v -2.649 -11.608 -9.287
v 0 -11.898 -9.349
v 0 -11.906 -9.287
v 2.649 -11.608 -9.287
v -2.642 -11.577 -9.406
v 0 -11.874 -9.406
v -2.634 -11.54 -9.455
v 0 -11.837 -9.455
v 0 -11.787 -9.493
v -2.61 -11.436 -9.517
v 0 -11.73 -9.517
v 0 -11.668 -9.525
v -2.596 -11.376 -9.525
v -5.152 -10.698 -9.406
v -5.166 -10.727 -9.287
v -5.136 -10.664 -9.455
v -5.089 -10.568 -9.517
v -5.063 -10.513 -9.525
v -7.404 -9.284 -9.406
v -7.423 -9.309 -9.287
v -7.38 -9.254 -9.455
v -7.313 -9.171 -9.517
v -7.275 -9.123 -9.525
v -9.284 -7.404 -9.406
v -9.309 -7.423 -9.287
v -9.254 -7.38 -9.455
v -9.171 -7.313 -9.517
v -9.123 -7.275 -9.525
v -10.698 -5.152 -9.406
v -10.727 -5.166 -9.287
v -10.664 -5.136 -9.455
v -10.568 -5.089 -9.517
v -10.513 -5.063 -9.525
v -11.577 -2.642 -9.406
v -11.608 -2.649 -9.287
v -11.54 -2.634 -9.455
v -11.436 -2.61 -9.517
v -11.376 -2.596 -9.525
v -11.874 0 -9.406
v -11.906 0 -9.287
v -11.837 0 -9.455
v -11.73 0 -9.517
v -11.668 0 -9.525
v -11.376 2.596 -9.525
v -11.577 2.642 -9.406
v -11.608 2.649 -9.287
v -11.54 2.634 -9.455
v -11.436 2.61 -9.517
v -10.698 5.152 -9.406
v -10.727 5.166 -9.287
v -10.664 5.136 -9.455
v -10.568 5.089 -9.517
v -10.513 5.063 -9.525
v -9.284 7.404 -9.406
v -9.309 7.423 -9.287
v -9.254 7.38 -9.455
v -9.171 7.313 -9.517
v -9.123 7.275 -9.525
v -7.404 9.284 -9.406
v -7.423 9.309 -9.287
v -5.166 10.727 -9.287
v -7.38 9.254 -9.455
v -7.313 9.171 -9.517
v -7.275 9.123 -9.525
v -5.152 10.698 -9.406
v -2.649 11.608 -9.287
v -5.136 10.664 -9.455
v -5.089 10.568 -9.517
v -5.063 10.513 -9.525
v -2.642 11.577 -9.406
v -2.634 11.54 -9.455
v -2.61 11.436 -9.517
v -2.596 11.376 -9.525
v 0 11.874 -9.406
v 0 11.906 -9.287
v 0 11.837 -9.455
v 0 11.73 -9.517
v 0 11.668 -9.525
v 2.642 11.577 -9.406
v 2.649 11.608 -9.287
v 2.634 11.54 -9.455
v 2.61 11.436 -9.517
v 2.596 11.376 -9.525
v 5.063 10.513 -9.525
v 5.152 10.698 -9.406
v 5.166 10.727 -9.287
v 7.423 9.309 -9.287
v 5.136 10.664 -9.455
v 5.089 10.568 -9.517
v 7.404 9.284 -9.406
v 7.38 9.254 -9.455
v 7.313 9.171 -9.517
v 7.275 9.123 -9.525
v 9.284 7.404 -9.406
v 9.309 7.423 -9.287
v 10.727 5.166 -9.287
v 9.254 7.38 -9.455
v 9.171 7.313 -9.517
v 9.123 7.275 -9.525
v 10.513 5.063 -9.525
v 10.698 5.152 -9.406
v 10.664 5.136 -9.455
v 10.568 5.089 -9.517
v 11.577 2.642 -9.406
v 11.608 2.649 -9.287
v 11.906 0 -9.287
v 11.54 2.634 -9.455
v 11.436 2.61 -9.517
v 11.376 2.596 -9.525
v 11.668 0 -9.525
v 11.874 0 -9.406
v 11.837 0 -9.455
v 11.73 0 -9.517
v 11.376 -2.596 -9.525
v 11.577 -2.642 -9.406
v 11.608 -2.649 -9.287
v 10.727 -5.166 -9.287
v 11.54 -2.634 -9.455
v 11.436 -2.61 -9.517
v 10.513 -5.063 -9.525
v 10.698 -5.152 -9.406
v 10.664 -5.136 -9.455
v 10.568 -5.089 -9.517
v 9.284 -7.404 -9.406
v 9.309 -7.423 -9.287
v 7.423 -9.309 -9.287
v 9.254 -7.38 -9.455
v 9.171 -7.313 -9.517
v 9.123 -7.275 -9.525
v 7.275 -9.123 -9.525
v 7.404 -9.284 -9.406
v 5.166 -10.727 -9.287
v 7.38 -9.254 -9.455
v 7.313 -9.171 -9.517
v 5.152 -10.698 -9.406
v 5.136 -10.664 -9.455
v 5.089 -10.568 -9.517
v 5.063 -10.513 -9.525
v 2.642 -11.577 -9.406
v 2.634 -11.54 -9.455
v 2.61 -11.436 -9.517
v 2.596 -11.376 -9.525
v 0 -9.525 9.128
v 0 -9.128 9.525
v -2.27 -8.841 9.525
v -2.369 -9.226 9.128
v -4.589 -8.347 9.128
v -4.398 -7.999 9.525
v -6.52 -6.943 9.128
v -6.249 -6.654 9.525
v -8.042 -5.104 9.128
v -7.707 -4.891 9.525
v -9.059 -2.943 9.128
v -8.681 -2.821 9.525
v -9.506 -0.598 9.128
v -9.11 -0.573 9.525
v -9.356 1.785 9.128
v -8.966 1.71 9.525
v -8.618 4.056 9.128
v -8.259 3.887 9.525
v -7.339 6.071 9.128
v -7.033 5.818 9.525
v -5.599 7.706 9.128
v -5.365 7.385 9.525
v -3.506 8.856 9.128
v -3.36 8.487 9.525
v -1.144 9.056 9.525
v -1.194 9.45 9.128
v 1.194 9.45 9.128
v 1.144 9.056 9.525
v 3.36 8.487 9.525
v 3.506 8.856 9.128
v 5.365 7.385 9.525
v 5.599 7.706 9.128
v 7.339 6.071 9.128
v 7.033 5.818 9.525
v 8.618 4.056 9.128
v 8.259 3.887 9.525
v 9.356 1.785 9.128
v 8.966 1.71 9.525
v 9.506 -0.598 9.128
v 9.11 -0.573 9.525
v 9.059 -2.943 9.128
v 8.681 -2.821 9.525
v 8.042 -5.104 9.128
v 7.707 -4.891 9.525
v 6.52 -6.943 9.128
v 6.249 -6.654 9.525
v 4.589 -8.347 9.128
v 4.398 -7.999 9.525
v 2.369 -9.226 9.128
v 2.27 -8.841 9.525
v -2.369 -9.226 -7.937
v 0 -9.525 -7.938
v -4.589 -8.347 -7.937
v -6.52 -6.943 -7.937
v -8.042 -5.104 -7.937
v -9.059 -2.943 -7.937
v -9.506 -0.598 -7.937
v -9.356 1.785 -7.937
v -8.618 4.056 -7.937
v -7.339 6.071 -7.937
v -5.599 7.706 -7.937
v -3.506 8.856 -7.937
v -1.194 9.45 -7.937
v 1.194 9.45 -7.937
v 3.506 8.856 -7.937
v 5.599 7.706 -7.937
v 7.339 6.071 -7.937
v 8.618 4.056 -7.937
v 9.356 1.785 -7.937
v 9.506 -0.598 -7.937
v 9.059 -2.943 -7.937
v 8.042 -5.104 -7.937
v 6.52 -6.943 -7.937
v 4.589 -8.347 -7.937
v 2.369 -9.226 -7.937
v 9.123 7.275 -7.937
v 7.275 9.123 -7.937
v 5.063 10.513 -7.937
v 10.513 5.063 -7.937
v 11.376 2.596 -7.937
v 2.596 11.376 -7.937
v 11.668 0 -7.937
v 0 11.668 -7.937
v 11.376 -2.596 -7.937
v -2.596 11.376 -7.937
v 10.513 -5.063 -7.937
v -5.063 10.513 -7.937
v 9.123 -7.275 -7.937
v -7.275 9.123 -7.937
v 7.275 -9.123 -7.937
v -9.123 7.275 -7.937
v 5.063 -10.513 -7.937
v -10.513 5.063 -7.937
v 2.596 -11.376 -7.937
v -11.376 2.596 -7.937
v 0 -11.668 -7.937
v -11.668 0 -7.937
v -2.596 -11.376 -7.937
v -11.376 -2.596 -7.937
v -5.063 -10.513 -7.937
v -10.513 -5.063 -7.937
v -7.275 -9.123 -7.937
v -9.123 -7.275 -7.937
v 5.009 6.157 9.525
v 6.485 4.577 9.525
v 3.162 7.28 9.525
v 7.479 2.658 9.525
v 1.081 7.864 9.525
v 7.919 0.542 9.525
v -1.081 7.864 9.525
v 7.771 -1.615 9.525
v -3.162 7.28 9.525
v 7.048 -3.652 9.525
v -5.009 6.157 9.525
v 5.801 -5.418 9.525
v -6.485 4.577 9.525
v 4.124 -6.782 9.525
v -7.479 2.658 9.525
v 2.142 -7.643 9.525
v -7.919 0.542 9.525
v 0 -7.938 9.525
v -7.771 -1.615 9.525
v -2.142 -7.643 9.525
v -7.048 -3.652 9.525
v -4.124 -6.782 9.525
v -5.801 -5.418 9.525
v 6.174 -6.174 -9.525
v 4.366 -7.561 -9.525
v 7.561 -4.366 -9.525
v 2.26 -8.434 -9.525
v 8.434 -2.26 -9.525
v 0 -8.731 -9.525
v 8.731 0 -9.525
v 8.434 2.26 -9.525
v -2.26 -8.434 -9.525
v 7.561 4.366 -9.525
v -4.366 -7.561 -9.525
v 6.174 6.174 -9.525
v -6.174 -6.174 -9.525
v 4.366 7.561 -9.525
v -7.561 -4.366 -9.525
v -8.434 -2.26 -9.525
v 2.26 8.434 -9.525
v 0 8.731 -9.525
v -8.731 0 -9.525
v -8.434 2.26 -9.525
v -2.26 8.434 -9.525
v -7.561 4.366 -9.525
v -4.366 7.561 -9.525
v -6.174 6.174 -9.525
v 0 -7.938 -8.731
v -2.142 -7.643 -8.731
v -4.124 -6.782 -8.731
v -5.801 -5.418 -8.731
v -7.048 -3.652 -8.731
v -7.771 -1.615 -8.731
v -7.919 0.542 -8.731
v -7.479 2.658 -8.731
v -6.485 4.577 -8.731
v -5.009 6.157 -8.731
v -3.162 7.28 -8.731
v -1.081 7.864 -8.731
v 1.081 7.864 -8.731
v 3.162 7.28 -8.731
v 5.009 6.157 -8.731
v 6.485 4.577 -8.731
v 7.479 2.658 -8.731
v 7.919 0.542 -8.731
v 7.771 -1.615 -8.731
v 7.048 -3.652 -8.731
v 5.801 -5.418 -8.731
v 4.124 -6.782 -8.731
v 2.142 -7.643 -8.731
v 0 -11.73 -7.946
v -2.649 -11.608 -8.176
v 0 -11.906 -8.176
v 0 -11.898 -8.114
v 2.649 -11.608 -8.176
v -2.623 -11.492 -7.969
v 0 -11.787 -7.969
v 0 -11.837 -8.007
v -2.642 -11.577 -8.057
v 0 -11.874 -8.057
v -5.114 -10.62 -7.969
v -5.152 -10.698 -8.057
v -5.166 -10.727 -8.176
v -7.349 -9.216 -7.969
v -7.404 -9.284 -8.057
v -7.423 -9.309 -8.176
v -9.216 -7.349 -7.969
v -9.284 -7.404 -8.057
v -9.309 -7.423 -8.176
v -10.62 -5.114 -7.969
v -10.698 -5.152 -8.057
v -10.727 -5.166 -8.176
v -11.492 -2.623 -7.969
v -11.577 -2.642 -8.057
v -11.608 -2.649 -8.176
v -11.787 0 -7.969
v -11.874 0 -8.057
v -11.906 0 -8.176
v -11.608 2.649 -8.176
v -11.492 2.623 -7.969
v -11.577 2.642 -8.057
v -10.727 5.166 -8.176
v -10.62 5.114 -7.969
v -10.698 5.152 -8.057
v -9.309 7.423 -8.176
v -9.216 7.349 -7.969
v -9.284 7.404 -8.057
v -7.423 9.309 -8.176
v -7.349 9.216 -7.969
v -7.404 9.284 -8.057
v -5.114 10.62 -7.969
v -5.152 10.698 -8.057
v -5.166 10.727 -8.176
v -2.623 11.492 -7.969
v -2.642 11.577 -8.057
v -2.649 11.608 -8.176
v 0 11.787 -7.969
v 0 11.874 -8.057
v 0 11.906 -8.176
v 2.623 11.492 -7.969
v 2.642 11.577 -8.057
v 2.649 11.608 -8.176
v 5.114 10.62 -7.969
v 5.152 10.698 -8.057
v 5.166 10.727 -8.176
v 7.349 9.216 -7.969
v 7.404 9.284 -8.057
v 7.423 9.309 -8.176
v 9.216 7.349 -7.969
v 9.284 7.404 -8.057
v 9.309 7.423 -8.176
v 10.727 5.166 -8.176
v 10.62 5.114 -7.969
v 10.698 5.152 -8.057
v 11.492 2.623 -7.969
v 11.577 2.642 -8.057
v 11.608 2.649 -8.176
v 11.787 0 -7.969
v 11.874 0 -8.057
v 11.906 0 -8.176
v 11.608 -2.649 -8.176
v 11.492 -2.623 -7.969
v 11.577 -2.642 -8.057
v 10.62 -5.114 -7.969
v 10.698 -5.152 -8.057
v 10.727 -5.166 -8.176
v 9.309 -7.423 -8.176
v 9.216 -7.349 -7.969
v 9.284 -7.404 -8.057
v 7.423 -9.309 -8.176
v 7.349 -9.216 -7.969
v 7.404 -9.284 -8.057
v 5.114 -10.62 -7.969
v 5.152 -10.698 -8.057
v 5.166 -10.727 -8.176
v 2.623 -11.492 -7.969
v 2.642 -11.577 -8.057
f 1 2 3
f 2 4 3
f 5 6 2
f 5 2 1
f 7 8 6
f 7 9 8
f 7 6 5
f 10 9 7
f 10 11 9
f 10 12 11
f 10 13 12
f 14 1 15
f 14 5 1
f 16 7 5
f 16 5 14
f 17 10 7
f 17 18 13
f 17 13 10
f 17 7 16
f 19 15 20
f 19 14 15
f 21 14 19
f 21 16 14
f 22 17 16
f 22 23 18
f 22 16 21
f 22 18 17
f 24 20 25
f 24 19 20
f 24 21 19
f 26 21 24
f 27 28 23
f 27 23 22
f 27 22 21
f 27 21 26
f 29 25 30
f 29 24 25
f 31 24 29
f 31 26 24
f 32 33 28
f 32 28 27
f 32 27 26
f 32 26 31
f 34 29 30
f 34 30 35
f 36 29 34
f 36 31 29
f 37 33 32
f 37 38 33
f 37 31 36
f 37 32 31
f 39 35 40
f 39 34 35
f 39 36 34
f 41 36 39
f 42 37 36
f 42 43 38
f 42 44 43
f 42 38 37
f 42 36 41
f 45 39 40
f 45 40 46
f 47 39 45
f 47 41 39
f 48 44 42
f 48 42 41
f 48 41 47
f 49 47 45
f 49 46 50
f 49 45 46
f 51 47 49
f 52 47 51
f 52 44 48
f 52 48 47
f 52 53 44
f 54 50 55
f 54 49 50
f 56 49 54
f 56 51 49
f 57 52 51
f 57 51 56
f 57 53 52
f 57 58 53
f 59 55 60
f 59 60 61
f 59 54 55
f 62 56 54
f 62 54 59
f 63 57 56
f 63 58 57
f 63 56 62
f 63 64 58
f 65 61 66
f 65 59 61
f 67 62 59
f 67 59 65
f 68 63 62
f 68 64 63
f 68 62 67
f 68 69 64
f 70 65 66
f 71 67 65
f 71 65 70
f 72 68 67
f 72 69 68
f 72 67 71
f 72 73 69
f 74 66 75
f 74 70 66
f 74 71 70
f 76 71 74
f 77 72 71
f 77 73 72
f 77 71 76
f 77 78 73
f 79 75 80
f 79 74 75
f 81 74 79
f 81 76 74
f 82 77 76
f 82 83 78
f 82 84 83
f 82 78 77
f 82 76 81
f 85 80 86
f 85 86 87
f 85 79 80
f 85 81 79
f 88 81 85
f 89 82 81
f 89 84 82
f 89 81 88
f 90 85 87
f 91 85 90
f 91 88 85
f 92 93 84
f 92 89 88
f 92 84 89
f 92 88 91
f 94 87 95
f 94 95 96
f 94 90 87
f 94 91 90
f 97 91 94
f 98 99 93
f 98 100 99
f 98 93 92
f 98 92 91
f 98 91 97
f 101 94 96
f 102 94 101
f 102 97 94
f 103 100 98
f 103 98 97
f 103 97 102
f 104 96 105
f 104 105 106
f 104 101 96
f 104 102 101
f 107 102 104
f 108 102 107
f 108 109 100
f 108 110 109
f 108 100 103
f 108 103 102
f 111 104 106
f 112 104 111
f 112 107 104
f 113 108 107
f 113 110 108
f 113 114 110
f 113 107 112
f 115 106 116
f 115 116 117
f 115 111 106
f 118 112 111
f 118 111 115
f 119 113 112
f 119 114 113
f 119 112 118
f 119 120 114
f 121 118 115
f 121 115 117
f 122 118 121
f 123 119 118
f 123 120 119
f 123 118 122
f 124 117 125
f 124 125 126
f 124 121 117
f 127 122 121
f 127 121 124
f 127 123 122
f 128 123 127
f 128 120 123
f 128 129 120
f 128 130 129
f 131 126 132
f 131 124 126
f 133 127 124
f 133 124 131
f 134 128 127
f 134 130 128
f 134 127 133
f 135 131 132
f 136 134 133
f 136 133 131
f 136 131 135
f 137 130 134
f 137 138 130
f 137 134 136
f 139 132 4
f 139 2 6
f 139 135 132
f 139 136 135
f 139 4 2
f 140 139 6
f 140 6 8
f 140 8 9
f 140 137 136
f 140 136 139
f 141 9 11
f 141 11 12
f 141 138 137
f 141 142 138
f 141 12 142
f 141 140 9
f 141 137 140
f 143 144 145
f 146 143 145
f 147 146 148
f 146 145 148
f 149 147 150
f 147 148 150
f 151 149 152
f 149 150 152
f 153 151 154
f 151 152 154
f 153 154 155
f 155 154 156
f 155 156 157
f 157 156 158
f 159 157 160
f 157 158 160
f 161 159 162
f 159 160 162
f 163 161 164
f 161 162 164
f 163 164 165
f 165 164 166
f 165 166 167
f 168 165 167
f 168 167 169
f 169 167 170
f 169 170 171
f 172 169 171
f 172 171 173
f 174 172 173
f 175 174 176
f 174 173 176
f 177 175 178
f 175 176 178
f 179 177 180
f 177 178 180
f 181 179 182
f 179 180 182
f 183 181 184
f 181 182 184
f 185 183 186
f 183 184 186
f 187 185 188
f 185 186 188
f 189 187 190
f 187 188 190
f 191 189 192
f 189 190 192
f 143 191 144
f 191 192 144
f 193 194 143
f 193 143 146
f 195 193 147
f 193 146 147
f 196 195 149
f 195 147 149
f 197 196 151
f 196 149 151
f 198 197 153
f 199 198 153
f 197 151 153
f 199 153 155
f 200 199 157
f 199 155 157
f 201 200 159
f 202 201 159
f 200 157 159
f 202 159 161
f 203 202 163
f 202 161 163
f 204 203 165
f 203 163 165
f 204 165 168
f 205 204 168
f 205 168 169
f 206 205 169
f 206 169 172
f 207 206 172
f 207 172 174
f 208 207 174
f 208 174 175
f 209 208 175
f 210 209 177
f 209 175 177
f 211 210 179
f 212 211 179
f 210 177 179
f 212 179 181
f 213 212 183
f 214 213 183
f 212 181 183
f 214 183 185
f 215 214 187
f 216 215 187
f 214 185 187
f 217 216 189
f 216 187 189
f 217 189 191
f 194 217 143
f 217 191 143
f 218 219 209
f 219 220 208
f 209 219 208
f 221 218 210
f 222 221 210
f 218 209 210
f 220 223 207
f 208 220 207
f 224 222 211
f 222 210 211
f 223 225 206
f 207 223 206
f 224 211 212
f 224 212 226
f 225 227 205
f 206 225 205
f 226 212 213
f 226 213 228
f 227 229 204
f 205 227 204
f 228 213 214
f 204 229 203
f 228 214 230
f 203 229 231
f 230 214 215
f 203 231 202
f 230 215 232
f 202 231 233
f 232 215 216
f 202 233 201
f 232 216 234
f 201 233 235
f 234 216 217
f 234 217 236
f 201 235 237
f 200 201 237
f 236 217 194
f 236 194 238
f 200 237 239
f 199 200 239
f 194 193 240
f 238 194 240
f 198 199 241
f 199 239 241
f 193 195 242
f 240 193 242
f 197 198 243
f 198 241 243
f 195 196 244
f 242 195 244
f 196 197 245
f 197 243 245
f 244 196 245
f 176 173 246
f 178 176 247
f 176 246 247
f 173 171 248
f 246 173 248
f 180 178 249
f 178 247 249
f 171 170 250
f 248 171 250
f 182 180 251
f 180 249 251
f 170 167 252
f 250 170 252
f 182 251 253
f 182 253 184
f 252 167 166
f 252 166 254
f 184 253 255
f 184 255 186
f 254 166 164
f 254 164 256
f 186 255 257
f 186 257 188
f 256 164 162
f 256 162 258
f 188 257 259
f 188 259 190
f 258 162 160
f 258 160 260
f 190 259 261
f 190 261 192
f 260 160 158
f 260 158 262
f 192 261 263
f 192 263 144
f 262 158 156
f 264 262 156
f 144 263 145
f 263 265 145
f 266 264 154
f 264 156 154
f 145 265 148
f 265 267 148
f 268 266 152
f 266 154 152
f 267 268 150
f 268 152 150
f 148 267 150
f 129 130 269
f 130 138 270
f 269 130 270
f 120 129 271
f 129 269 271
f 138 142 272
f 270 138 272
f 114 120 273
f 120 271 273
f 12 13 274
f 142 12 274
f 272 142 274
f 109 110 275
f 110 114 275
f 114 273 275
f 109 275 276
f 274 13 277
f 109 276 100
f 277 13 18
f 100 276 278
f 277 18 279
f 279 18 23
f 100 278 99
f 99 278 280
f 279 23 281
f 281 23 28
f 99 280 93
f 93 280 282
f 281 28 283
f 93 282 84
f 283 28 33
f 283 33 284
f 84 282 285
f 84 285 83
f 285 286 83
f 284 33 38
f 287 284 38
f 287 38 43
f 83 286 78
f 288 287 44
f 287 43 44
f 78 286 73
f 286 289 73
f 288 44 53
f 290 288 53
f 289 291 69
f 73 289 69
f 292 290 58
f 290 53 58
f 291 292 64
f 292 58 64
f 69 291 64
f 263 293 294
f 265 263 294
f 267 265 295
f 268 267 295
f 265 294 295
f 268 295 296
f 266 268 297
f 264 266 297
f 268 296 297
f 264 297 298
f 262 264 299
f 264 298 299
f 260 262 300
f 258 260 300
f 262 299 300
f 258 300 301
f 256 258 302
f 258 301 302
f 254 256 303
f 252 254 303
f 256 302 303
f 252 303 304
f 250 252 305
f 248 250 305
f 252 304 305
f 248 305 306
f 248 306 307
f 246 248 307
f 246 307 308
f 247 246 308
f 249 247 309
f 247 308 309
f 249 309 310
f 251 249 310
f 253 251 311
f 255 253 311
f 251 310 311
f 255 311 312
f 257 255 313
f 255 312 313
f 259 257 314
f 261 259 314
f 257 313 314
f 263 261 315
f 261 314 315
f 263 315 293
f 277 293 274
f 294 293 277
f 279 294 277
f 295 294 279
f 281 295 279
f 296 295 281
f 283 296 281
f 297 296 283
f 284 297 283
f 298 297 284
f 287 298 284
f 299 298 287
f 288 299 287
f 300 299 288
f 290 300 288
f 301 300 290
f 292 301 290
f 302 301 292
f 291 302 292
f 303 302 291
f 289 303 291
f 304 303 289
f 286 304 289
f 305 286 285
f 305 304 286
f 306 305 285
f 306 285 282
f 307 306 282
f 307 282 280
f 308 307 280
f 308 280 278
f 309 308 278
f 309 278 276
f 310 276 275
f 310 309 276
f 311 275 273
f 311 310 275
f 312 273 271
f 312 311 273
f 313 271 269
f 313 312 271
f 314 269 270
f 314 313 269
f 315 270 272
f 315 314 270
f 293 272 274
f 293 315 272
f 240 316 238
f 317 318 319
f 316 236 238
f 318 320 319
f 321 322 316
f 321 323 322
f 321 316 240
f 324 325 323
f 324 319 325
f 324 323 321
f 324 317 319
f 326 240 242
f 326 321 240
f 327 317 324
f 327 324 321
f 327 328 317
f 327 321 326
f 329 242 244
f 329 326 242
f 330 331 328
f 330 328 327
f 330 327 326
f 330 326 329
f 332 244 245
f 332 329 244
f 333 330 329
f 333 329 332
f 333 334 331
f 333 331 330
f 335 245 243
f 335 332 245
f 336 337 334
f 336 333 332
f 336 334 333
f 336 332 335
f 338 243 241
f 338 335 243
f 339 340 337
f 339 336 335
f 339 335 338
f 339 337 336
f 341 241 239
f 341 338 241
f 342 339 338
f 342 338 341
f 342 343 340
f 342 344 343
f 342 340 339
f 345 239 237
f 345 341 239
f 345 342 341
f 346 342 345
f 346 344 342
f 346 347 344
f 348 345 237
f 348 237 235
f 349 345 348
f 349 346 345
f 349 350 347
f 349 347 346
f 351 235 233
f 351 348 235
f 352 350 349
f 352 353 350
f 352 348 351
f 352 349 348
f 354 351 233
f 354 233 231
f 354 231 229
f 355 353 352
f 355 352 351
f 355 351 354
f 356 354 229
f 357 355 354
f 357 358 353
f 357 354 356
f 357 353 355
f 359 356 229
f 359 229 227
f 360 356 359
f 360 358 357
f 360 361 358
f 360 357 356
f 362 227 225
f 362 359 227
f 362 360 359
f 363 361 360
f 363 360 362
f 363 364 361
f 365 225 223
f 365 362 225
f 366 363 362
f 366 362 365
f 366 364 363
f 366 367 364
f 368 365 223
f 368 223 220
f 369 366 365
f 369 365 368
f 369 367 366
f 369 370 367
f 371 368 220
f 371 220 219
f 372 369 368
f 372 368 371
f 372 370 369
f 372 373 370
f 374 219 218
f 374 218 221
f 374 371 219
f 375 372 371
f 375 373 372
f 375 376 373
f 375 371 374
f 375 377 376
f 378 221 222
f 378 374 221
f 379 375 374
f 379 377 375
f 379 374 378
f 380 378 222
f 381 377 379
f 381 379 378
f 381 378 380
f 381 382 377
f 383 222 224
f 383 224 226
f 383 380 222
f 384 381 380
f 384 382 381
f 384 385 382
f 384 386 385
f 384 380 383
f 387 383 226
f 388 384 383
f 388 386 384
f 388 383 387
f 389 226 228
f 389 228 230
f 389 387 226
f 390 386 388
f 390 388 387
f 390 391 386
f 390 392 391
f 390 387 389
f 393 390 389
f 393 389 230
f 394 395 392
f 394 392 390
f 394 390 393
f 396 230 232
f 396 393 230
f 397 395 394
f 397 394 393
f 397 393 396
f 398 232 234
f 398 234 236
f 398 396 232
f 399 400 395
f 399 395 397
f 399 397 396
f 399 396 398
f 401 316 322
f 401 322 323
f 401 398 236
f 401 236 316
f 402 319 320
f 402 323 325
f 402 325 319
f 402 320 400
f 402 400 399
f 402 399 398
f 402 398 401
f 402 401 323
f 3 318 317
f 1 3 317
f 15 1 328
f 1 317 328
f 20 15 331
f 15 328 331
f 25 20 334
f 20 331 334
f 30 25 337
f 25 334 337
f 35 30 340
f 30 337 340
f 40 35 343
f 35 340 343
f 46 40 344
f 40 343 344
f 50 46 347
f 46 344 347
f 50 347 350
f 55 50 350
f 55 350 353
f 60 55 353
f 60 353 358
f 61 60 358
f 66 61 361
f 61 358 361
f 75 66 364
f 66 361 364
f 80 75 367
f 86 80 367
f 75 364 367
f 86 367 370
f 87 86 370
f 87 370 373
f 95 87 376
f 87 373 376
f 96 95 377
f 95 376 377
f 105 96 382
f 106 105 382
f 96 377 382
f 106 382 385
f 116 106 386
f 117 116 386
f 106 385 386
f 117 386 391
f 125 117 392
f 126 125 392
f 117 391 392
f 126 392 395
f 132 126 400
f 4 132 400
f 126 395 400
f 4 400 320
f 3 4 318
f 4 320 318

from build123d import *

# Parameters (mm, degrees)
CHAMFER1_SIZE = 0.396875
FILLET2_R     = 0.238125
CHAMFER2_SIZE = 0.79375


with BuildPart() as part:
    # Sketch3 → Revolve1 (revolve)
    with BuildSketch(Plane(origin=(0, 0, 0), x_dir=(0, 0, -1), z_dir=(1, 0, 0)), mode=Mode.PRIVATE) as revolve1_sk:
        Polygon((-9.525, 7.9375), (9.525, 7.9375), (9.525, 11.90625), (7.9375, 11.90625), (7.9375, 9.525), (-9.525, 9.525), align=None)
    revolve(revolve1_sk.sketch.rotate(Axis((0, 0, 9.525), (0, 0, -1)), 180), axis=Axis((0, 0, 9.525), (0, 0, -1)))

    # Chamfer1
    chamfer1_edges = [part.edges().sort_by_distance(p)[0] for p in [
        (0, 9.525, 9.525),
    ]]
    chamfer(chamfer1_edges, length=CHAMFER1_SIZE)

    # Fillet2
    fillet2_edges = [part.edges().sort_by_distance(p)[0] for p in [
        (0, 11.90625, -7.9375),
        (0, 11.90625, -9.525),
    ]]
    fillet(fillet2_edges, radius=FILLET2_R)

    # Chamfer2
    chamfer2_edges = [part.edges().sort_by_distance(p)[0] for p in [
        (0, 7.9375, -9.525),
    ]]
    chamfer(chamfer2_edges, length=CHAMFER2_SIZE)


solid = part.part
